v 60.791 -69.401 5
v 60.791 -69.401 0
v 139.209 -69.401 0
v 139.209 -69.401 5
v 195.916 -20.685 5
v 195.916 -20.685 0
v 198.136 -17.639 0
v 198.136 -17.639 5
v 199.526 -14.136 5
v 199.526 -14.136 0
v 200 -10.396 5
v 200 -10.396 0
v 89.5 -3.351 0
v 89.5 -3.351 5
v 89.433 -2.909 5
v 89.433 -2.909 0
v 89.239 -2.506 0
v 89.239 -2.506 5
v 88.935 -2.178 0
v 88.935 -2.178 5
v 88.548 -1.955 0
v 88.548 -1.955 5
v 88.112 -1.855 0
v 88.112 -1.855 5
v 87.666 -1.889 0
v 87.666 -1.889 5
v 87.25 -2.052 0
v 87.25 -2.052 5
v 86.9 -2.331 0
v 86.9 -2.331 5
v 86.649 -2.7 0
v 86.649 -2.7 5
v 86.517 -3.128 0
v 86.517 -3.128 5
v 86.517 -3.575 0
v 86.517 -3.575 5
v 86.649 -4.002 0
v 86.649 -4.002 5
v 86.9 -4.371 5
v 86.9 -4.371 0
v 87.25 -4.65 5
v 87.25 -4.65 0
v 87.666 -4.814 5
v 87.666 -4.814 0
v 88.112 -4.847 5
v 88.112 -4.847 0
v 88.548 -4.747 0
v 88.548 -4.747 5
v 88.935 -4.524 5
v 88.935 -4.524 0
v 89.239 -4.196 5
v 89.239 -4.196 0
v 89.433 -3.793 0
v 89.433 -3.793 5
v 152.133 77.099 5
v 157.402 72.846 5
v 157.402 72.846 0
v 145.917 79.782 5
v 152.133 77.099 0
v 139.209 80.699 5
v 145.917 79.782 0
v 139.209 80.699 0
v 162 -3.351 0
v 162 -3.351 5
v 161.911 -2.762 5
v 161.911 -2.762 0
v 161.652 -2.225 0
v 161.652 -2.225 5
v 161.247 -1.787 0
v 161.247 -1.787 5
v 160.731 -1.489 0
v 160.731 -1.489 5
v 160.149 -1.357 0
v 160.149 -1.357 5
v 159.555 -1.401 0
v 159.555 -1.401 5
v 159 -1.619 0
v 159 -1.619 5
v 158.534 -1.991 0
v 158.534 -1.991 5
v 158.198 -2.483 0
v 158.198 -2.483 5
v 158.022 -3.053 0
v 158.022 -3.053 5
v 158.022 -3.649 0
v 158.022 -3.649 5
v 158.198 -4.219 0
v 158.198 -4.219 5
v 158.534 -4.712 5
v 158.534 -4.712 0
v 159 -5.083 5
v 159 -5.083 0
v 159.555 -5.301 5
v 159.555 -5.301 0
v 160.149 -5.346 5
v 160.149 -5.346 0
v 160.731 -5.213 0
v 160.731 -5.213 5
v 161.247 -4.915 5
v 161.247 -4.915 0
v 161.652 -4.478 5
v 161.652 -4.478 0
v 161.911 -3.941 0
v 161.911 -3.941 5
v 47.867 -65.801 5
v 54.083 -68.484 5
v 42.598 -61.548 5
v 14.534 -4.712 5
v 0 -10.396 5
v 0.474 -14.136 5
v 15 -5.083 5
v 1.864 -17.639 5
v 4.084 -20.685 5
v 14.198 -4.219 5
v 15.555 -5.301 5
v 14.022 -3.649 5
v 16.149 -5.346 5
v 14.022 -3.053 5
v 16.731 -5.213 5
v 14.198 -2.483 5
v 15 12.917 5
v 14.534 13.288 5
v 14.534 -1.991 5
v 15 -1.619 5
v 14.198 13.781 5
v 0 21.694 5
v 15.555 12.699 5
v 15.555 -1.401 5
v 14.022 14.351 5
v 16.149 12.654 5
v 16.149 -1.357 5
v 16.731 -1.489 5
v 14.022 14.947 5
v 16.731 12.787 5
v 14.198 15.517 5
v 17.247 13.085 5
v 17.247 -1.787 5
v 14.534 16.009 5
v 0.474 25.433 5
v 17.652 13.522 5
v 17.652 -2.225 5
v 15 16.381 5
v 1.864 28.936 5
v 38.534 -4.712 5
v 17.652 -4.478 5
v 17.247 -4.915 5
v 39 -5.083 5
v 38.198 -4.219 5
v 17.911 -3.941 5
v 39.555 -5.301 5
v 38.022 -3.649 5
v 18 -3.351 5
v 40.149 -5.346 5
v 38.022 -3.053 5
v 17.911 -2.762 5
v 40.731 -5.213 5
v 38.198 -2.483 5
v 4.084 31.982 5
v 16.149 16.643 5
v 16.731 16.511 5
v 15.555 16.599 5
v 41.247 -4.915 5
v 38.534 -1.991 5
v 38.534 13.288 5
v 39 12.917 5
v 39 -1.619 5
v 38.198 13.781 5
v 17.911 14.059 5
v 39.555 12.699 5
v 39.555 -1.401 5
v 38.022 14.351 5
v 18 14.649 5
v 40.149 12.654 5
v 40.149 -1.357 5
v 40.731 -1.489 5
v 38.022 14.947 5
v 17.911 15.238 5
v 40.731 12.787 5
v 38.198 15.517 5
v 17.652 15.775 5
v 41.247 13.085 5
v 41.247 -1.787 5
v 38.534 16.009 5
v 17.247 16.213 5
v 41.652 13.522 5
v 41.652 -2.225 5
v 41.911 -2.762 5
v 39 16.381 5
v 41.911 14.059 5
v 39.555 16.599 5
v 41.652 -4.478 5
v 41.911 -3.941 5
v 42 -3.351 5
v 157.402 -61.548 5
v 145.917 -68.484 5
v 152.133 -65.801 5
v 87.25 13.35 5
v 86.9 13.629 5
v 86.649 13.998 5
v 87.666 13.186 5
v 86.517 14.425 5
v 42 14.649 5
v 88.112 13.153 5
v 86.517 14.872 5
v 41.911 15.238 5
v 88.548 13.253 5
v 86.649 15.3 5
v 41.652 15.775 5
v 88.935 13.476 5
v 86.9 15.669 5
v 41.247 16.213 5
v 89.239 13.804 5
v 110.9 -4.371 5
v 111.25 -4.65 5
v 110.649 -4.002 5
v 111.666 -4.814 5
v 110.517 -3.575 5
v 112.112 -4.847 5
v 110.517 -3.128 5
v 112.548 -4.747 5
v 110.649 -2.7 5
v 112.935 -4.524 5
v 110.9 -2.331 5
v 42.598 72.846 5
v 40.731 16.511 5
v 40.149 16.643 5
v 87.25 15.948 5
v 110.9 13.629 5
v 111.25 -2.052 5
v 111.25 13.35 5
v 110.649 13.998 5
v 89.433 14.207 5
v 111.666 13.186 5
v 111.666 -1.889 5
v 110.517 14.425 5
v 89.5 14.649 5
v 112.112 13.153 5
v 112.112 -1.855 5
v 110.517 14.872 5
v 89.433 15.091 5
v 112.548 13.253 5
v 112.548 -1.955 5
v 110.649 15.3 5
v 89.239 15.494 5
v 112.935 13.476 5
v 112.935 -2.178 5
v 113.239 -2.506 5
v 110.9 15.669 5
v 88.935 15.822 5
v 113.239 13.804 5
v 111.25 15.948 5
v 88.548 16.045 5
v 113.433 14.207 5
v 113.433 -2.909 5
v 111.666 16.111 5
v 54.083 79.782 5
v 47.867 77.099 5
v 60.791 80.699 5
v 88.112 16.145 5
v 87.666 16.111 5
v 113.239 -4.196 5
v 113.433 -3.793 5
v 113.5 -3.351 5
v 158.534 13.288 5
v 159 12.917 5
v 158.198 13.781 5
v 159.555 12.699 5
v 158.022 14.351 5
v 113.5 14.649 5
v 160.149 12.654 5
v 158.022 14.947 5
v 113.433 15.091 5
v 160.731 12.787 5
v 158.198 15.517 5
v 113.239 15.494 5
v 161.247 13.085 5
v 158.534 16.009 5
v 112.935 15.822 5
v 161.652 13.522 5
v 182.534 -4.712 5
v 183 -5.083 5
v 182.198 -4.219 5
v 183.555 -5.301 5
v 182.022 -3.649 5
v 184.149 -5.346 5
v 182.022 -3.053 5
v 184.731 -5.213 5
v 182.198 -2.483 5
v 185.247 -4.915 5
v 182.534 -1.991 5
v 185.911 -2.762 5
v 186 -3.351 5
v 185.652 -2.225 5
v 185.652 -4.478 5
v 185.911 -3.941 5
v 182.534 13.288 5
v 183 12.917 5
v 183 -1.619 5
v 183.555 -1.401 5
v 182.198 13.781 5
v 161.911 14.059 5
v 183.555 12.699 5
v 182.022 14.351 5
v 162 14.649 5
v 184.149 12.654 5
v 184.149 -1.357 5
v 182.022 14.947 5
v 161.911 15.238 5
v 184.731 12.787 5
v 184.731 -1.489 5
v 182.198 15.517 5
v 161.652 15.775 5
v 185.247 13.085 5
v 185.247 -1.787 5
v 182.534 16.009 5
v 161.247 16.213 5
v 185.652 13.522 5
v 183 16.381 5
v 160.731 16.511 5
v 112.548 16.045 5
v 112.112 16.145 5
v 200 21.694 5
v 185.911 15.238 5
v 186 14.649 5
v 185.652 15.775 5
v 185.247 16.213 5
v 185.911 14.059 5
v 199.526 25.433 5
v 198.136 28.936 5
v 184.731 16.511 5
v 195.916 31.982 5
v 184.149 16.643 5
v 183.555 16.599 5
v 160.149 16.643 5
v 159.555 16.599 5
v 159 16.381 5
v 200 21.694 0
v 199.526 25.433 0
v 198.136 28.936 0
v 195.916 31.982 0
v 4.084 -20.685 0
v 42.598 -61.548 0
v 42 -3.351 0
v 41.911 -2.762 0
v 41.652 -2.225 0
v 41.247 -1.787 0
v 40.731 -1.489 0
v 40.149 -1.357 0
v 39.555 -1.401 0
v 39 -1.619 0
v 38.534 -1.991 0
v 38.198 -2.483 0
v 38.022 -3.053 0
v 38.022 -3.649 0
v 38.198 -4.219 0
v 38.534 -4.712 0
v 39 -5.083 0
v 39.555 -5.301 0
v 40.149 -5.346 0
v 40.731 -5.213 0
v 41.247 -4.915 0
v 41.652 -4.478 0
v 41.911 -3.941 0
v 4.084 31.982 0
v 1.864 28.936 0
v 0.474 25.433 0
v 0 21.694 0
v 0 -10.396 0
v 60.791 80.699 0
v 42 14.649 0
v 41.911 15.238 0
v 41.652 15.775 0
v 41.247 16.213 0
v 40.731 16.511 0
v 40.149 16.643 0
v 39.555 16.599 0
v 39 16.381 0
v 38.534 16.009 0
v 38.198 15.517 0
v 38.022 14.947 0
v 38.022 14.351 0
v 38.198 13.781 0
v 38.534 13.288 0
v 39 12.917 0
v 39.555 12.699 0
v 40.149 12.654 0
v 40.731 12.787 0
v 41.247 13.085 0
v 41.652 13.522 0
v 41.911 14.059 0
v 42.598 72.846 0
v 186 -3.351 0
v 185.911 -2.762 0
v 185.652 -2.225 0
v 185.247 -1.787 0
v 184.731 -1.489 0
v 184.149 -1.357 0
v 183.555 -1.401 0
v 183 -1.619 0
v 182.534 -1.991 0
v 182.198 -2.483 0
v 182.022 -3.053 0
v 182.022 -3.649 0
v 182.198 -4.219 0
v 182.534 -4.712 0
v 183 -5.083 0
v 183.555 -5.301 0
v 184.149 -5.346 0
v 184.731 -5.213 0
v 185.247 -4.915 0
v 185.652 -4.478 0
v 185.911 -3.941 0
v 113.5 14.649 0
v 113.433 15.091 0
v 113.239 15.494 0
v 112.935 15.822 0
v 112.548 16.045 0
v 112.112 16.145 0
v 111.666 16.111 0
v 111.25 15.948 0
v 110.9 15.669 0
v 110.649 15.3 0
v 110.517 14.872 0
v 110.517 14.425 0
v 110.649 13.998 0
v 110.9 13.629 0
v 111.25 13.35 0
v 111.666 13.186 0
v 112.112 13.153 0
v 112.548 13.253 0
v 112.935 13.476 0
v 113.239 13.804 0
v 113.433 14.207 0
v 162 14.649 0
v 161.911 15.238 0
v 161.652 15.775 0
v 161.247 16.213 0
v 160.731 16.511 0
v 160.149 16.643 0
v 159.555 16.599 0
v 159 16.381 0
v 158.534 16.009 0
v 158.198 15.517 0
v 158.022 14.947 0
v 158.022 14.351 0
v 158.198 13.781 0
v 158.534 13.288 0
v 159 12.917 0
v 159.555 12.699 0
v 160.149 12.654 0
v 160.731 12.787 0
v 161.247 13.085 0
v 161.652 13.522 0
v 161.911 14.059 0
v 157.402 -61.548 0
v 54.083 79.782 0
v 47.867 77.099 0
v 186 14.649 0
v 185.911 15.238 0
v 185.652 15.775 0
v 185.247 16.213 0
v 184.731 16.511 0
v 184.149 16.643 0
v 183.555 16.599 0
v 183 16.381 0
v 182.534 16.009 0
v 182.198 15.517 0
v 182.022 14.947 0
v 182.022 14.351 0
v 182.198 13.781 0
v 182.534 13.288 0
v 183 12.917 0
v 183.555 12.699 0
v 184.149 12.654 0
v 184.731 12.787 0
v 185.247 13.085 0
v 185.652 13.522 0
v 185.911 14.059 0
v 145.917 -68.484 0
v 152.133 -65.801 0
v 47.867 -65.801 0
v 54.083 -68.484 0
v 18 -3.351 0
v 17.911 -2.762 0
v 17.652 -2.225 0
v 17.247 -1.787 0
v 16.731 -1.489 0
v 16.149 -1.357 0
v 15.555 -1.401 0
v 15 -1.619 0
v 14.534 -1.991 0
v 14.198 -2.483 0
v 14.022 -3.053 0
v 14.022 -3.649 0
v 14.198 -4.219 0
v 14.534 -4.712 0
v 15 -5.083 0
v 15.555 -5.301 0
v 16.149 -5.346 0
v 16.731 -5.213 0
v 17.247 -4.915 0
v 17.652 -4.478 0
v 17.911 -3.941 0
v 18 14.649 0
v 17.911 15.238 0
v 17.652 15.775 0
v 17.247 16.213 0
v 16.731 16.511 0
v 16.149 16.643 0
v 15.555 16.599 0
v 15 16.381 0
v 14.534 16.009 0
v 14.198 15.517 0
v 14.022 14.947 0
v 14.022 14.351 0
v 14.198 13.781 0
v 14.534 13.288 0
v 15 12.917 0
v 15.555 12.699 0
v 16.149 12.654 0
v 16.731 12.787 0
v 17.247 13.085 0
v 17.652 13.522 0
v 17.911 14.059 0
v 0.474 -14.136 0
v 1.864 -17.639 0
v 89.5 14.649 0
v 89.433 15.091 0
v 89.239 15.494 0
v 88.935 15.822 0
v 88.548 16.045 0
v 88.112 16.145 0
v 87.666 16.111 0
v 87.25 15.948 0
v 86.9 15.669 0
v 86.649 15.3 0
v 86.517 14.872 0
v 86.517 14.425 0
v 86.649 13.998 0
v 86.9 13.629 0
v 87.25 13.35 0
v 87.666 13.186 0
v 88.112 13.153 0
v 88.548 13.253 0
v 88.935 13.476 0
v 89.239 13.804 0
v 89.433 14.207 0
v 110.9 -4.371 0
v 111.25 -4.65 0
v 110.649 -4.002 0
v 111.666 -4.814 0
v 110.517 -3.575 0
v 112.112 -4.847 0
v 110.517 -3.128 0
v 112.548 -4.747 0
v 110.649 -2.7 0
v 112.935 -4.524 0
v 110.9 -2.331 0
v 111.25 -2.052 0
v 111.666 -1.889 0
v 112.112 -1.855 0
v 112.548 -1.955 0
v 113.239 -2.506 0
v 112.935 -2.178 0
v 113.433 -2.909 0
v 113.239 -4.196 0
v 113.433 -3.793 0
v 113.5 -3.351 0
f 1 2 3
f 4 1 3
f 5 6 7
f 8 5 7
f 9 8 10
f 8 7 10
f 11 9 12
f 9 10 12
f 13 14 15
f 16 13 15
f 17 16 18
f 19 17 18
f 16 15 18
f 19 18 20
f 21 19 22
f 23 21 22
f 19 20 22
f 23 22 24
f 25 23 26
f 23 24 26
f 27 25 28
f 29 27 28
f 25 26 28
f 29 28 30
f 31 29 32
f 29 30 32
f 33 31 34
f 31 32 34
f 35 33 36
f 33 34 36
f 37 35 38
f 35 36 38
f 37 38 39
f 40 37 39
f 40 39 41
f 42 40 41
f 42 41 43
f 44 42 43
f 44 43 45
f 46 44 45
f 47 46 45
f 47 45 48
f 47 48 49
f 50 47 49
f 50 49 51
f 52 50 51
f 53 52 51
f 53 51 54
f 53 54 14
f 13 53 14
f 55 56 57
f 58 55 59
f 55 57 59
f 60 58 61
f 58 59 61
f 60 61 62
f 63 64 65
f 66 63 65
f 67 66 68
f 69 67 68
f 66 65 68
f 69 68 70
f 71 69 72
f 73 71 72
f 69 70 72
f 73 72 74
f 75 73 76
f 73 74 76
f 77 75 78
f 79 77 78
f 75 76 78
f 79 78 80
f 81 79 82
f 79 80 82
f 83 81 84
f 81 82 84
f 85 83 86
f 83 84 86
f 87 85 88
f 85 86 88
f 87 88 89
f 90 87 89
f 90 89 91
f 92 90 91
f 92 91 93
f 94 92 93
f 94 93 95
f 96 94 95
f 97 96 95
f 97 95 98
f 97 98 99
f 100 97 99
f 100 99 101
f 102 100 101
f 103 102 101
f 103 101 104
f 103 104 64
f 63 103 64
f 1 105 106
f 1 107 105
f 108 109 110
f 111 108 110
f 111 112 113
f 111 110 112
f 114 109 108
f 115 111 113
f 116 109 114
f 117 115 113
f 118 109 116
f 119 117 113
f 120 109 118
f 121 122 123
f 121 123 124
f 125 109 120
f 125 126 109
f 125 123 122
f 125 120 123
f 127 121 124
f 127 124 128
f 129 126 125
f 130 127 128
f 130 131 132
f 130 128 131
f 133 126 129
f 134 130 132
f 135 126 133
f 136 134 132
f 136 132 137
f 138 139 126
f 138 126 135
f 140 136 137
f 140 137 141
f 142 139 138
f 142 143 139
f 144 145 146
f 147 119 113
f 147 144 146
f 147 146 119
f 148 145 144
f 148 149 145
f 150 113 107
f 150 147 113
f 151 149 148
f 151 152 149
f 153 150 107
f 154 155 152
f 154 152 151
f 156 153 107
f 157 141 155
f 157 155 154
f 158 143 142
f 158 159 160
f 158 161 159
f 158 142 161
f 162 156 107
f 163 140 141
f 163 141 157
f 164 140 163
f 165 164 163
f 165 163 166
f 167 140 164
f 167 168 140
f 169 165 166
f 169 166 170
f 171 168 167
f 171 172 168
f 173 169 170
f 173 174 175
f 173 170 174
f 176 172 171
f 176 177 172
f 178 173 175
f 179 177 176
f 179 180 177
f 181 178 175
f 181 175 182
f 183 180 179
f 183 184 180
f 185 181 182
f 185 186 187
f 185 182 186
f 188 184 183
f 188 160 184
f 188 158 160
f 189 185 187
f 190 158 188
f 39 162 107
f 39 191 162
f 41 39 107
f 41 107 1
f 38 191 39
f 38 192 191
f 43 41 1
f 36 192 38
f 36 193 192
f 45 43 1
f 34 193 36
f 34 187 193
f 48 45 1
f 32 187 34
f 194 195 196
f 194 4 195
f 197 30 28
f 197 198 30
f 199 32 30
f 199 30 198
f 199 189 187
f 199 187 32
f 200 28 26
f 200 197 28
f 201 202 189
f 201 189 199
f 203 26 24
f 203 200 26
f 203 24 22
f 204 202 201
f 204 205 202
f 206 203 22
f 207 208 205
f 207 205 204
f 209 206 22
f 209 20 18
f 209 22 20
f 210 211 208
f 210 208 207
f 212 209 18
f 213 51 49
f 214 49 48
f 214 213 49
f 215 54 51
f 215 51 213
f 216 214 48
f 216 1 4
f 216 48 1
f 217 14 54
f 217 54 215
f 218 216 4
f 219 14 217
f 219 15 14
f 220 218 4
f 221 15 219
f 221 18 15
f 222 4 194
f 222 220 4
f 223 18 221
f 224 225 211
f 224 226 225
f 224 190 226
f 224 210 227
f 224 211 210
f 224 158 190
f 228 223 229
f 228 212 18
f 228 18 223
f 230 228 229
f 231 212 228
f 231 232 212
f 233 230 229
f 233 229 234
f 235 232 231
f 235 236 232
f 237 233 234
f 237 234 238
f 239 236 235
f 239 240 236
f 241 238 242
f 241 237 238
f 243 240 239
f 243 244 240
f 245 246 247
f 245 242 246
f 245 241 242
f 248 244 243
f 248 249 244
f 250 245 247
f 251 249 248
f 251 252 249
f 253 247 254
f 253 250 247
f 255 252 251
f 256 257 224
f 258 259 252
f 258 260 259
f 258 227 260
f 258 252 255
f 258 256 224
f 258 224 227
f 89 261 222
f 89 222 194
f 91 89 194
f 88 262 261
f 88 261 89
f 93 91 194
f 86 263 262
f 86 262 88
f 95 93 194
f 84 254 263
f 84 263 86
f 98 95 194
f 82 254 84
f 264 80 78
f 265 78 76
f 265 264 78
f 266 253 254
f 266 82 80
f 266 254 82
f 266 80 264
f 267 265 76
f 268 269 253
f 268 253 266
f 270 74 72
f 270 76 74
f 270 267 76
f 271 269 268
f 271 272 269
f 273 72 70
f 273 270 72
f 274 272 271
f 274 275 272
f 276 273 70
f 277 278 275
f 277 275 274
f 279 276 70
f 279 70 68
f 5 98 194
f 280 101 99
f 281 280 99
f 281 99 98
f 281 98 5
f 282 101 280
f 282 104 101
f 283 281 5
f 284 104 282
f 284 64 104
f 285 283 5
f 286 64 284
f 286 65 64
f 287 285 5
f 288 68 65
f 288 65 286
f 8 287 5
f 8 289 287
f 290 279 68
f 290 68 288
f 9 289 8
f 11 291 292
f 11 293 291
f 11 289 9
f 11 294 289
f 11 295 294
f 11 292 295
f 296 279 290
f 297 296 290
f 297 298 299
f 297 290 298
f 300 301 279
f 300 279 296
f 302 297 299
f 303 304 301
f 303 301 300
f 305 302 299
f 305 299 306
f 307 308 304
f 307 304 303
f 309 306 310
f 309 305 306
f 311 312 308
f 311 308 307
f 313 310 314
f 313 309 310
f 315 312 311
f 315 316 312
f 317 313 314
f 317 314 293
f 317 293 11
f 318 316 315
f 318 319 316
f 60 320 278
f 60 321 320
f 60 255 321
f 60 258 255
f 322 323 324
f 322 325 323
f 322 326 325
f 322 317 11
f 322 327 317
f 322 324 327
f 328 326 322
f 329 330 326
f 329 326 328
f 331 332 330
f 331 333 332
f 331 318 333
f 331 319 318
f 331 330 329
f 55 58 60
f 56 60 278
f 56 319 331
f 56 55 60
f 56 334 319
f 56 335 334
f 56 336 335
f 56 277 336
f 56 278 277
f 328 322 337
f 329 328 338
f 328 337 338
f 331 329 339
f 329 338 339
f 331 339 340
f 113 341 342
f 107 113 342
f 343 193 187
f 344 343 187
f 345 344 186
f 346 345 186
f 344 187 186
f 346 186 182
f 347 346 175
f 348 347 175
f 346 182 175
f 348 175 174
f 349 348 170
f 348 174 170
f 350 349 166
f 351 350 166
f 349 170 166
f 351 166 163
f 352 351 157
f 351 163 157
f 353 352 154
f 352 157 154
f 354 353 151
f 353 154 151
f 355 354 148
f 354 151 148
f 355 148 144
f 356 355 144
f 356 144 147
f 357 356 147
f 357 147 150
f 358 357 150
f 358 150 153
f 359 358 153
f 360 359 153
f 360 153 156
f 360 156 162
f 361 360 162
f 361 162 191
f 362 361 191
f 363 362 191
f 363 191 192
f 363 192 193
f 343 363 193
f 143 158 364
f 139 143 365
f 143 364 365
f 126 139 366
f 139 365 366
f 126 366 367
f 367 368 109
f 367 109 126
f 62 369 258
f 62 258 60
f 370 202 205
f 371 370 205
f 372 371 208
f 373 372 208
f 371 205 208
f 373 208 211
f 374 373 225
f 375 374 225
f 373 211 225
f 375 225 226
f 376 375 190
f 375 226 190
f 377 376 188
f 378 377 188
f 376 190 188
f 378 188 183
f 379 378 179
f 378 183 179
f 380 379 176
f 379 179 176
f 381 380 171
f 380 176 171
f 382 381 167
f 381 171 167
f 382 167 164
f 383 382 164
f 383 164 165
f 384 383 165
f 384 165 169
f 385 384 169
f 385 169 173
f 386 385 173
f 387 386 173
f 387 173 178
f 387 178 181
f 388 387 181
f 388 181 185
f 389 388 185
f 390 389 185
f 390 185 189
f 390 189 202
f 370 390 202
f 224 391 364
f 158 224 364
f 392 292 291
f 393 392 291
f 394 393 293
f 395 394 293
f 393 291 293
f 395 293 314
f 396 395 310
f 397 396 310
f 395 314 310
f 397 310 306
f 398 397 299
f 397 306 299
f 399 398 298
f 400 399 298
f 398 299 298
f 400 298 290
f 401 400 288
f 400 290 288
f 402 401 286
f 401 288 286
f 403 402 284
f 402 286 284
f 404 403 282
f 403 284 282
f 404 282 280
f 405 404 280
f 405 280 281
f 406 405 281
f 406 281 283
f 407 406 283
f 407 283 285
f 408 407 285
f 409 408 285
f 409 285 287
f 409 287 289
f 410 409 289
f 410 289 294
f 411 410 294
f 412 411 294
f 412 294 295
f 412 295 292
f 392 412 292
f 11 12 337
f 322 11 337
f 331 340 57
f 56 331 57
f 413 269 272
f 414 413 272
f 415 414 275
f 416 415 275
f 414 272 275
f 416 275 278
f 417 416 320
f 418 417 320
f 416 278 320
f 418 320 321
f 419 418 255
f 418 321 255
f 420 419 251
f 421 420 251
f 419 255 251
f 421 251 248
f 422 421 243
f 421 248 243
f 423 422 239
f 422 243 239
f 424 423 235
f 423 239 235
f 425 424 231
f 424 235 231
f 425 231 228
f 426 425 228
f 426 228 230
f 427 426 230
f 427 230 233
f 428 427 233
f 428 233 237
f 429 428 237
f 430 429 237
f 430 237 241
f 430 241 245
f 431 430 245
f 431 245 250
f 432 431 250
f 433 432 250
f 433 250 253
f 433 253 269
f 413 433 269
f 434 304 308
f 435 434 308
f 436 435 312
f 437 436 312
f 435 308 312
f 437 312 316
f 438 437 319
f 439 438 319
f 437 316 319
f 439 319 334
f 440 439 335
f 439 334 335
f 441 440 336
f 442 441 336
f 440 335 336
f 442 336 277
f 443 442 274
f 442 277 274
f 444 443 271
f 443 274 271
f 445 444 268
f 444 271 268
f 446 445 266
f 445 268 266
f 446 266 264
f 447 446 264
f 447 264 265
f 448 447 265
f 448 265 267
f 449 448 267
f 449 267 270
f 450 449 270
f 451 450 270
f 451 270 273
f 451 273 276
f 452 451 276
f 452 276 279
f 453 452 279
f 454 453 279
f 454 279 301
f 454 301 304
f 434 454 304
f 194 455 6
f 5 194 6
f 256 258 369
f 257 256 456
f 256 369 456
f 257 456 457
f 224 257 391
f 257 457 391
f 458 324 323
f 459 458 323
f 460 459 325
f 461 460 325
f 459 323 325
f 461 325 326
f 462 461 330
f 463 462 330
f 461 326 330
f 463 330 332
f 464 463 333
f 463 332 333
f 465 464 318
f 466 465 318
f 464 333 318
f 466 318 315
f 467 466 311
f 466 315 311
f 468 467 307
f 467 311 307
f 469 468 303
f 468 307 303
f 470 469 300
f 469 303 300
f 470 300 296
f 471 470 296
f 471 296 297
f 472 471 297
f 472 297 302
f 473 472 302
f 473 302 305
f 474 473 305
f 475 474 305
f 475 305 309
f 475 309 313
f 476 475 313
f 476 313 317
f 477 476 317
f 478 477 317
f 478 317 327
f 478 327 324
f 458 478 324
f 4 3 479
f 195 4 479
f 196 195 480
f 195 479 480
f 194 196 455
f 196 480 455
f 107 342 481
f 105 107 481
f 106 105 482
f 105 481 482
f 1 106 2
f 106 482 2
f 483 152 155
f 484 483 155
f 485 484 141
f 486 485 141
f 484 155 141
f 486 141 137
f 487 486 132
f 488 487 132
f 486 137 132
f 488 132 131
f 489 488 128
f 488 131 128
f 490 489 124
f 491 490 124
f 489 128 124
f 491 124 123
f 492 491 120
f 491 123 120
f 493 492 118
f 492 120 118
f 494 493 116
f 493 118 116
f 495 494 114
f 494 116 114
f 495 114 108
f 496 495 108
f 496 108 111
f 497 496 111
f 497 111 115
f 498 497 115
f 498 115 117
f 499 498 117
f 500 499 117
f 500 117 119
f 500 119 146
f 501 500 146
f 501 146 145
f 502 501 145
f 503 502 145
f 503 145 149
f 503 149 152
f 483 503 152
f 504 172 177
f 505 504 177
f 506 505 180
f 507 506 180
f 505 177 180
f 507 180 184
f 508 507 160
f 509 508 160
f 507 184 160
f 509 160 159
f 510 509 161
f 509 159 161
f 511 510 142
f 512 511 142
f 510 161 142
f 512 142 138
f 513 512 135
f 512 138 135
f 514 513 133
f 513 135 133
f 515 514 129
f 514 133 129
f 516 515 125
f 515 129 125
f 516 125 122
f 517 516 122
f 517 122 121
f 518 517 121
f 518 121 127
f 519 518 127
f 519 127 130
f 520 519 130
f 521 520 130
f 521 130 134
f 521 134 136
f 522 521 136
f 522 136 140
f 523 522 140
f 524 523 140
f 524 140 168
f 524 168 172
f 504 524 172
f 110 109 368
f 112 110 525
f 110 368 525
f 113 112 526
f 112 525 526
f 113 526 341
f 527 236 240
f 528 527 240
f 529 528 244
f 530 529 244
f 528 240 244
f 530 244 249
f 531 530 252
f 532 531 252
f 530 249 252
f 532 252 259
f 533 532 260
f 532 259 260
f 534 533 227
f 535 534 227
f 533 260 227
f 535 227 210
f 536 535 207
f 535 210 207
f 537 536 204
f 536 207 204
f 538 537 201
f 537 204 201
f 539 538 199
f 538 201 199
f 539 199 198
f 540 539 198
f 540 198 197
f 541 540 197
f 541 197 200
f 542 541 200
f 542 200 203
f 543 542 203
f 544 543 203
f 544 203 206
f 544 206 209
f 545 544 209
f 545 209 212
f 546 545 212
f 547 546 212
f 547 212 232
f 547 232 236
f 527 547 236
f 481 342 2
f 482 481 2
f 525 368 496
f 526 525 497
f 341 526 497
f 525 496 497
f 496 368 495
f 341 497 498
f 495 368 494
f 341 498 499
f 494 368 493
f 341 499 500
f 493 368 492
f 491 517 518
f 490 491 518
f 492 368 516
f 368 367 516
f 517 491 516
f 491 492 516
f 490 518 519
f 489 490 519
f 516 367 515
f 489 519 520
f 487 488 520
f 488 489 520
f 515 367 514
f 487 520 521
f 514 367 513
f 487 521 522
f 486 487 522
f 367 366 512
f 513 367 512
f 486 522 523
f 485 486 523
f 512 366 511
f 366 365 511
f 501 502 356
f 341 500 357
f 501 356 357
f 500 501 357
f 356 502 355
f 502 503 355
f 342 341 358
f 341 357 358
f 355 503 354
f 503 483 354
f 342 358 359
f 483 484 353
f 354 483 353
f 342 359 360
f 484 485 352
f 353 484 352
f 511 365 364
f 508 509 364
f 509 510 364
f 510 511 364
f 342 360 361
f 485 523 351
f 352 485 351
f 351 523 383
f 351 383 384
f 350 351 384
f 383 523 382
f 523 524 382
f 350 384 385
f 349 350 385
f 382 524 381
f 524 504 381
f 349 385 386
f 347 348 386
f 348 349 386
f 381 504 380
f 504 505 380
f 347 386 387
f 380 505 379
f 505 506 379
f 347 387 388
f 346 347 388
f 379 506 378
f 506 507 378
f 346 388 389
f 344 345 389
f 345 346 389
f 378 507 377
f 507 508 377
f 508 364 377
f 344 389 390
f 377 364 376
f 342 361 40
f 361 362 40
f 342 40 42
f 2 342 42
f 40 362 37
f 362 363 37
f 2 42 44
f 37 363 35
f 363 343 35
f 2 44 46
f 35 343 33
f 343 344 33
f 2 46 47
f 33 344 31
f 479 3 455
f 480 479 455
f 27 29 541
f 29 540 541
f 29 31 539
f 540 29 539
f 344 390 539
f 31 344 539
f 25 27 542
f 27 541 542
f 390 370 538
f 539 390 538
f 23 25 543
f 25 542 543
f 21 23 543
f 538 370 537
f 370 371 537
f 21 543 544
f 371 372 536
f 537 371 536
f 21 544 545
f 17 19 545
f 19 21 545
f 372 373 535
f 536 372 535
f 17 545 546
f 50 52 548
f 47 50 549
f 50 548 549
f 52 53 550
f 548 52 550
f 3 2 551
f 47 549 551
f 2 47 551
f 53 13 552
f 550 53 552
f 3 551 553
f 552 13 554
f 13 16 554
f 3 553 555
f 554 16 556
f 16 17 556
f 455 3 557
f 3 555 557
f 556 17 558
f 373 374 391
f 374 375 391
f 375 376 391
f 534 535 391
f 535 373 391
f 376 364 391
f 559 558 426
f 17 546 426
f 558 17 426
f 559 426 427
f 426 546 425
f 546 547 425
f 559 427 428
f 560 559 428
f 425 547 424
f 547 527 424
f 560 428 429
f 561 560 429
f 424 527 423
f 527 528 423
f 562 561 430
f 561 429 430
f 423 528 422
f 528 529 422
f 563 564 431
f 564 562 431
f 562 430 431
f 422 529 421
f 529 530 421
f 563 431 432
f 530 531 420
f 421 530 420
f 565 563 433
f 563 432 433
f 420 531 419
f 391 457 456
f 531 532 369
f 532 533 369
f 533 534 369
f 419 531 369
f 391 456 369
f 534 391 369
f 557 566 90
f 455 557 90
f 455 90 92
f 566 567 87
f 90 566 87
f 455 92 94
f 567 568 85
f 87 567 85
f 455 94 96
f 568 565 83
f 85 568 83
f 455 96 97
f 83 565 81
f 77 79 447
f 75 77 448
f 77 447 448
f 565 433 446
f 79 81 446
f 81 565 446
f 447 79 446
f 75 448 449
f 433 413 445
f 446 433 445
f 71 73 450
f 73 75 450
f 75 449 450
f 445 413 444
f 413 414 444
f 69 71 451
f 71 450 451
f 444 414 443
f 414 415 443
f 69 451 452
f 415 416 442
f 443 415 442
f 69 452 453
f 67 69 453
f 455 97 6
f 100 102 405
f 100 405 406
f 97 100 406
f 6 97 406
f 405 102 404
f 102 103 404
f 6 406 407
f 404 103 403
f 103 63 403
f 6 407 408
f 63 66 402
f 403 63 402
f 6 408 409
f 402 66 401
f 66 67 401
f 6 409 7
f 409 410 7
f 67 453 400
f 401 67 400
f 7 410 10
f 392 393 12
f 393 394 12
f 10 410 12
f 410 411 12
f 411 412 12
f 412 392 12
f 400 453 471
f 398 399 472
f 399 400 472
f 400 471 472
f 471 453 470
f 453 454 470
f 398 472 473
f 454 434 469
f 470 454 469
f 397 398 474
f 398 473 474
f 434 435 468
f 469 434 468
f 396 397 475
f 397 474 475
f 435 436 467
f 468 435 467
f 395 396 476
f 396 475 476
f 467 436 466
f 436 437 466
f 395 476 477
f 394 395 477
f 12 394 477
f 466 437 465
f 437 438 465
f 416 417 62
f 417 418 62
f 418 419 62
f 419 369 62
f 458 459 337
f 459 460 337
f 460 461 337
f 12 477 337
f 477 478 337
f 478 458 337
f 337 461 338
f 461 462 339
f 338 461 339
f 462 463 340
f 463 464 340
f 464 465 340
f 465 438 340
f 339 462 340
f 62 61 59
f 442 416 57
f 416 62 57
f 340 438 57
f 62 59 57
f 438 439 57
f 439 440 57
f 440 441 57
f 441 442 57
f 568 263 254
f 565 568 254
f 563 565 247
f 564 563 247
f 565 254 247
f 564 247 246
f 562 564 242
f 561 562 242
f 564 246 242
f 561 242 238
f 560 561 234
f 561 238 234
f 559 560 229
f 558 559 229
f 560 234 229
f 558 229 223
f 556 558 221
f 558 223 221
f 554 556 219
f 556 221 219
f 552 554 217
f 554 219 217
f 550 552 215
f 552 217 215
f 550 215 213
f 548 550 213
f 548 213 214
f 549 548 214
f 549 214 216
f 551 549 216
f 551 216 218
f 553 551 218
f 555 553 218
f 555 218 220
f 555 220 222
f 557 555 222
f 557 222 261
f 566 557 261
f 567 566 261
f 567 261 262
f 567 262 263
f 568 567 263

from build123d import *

# Parameters (mm, degrees)
CROQUIS1_W              = 200
CROQUIS1_H              = 150.1
SALIENTE_EXTRUIR1_DEPTH = 5
CROQUIS2_R              = 1.5
CROQUIS2_R_2            = 2
CORTAR_EXTRUIR1_DEPTH   = 10
CORTAR_EXTRUIR2_DEPTH   = 400


with BuildPart() as part:
    # Croquis1 → Saliente-Extruir1 (new body)
    with BuildSketch(Plane.XY):
        with Locations((100, 5.648844896)):
            Rectangle(CROQUIS1_W, CROQUIS1_H)
    extrude(amount=SALIENTE_EXTRUIR1_DEPTH)

    # Croquis2 → Cortar-Extruir1 (cut)
    with BuildSketch(Plane.XY.offset(5)):
        with Locations((88, 14.648844896)):
            Circle(CROQUIS2_R)
        with Locations((112, 14.648844896)):
            Circle(CROQUIS2_R)
        with Locations((88, -3.351155104)):
            Circle(CROQUIS2_R)
        with Locations((112, -3.351155104)):
            Circle(CROQUIS2_R)
        with Locations((16, 14.648844896)):
            Circle(CROQUIS2_R_2)
        with Locations((40, 14.648844896)):
            Circle(CROQUIS2_R_2)
        with Locations((40, -3.351155104)):
            Circle(CROQUIS2_R_2)
        with Locations((16, -3.351155104)):
            Circle(CROQUIS2_R_2)
        with Locations((184, -3.351155104)):
            Circle(CROQUIS2_R_2)
        with Locations((160, -3.351155104)):
            Circle(CROQUIS2_R_2)
        with Locations((160, 14.648844896)):
            Circle(CROQUIS2_R_2)
        with Locations((184, 14.648844896)):
            Circle(CROQUIS2_R_2)
    extrude(amount=-CORTAR_EXTRUIR1_DEPTH, mode=Mode.SUBTRACT)

    # Croquis3 → Cortar-Extruir2 (cut)
    with BuildSketch(Plane(origin=(0, 0, 0), x_dir=(-1, 0, 0), z_dir=(0, 0, -1))):
        with BuildLine():
            Line((-195.915748263, 31.98223599), (-157.401555296, 72.845794728))
            ThreePointArc((-157.401555296, 72.845794728), (-149.116372199, 78.651772224), (-139.208641525, 80.698844896))
            Line((-139.208641525, 80.698844896), (-200, 80.698844896))
            Line((-200, 80.698844896), (-200, 21.694066091))
            ThreePointArc((-200, 21.694066091), (-198.941596464, 27.2286743), (-195.915748263, 31.98223599))
        make_face()
        with BuildLine():
            Line((0, 80.698844896), (-60.791358475, 80.698844896))
            ThreePointArc((-60.791358475, 80.698844896), (-50.883627801, 78.651772224), (-42.598444704, 72.845794728))
            Line((-42.598444704, 72.845794728), (-4.084251737, 31.98223599))
            ThreePointArc((-4.084251737, 31.98223599), (-1.058403536, 27.2286743), (0, 21.694066091))
            Line((0, 21.694066091), (0, 80.698844896))
        make_face()
        with BuildLine():
            Line((0, -69.401155104), (0, -10.396376298))
            ThreePointArc((0, -10.396376298), (-1.058403536, -15.930984508), (-4.084251737, -20.684546197))
            Line((-4.084251737, -20.684546197), (-42.598444704, -61.548104935))
            ThreePointArc((-42.598444704, -61.548104935), (-50.883627801, -67.354082431), (-60.791358475, -69.401155104))
            Line((-60.791358475, -69.401155104), (0, -69.401155104))
        make_face()
        with BuildLine():
            ThreePointArc((-195.915748263, -20.684546197), (-198.941596464, -15.930984508), (-200, -10.396376298))
            Line((-200, -10.396376298), (-200, -69.401155104))
            Line((-200, -69.401155104), (-139.208641525, -69.401155104))
            ThreePointArc((-139.208641525, -69.401155104), (-149.116372199, -67.354082431), (-157.401555296, -61.548104935))
            Line((-157.401555296, -61.548104935), (-195.915748263, -20.684546197))
        make_face()
    extrude(amount=-CORTAR_EXTRUIR2_DEPTH, mode=Mode.SUBTRACT)


solid = part.part
